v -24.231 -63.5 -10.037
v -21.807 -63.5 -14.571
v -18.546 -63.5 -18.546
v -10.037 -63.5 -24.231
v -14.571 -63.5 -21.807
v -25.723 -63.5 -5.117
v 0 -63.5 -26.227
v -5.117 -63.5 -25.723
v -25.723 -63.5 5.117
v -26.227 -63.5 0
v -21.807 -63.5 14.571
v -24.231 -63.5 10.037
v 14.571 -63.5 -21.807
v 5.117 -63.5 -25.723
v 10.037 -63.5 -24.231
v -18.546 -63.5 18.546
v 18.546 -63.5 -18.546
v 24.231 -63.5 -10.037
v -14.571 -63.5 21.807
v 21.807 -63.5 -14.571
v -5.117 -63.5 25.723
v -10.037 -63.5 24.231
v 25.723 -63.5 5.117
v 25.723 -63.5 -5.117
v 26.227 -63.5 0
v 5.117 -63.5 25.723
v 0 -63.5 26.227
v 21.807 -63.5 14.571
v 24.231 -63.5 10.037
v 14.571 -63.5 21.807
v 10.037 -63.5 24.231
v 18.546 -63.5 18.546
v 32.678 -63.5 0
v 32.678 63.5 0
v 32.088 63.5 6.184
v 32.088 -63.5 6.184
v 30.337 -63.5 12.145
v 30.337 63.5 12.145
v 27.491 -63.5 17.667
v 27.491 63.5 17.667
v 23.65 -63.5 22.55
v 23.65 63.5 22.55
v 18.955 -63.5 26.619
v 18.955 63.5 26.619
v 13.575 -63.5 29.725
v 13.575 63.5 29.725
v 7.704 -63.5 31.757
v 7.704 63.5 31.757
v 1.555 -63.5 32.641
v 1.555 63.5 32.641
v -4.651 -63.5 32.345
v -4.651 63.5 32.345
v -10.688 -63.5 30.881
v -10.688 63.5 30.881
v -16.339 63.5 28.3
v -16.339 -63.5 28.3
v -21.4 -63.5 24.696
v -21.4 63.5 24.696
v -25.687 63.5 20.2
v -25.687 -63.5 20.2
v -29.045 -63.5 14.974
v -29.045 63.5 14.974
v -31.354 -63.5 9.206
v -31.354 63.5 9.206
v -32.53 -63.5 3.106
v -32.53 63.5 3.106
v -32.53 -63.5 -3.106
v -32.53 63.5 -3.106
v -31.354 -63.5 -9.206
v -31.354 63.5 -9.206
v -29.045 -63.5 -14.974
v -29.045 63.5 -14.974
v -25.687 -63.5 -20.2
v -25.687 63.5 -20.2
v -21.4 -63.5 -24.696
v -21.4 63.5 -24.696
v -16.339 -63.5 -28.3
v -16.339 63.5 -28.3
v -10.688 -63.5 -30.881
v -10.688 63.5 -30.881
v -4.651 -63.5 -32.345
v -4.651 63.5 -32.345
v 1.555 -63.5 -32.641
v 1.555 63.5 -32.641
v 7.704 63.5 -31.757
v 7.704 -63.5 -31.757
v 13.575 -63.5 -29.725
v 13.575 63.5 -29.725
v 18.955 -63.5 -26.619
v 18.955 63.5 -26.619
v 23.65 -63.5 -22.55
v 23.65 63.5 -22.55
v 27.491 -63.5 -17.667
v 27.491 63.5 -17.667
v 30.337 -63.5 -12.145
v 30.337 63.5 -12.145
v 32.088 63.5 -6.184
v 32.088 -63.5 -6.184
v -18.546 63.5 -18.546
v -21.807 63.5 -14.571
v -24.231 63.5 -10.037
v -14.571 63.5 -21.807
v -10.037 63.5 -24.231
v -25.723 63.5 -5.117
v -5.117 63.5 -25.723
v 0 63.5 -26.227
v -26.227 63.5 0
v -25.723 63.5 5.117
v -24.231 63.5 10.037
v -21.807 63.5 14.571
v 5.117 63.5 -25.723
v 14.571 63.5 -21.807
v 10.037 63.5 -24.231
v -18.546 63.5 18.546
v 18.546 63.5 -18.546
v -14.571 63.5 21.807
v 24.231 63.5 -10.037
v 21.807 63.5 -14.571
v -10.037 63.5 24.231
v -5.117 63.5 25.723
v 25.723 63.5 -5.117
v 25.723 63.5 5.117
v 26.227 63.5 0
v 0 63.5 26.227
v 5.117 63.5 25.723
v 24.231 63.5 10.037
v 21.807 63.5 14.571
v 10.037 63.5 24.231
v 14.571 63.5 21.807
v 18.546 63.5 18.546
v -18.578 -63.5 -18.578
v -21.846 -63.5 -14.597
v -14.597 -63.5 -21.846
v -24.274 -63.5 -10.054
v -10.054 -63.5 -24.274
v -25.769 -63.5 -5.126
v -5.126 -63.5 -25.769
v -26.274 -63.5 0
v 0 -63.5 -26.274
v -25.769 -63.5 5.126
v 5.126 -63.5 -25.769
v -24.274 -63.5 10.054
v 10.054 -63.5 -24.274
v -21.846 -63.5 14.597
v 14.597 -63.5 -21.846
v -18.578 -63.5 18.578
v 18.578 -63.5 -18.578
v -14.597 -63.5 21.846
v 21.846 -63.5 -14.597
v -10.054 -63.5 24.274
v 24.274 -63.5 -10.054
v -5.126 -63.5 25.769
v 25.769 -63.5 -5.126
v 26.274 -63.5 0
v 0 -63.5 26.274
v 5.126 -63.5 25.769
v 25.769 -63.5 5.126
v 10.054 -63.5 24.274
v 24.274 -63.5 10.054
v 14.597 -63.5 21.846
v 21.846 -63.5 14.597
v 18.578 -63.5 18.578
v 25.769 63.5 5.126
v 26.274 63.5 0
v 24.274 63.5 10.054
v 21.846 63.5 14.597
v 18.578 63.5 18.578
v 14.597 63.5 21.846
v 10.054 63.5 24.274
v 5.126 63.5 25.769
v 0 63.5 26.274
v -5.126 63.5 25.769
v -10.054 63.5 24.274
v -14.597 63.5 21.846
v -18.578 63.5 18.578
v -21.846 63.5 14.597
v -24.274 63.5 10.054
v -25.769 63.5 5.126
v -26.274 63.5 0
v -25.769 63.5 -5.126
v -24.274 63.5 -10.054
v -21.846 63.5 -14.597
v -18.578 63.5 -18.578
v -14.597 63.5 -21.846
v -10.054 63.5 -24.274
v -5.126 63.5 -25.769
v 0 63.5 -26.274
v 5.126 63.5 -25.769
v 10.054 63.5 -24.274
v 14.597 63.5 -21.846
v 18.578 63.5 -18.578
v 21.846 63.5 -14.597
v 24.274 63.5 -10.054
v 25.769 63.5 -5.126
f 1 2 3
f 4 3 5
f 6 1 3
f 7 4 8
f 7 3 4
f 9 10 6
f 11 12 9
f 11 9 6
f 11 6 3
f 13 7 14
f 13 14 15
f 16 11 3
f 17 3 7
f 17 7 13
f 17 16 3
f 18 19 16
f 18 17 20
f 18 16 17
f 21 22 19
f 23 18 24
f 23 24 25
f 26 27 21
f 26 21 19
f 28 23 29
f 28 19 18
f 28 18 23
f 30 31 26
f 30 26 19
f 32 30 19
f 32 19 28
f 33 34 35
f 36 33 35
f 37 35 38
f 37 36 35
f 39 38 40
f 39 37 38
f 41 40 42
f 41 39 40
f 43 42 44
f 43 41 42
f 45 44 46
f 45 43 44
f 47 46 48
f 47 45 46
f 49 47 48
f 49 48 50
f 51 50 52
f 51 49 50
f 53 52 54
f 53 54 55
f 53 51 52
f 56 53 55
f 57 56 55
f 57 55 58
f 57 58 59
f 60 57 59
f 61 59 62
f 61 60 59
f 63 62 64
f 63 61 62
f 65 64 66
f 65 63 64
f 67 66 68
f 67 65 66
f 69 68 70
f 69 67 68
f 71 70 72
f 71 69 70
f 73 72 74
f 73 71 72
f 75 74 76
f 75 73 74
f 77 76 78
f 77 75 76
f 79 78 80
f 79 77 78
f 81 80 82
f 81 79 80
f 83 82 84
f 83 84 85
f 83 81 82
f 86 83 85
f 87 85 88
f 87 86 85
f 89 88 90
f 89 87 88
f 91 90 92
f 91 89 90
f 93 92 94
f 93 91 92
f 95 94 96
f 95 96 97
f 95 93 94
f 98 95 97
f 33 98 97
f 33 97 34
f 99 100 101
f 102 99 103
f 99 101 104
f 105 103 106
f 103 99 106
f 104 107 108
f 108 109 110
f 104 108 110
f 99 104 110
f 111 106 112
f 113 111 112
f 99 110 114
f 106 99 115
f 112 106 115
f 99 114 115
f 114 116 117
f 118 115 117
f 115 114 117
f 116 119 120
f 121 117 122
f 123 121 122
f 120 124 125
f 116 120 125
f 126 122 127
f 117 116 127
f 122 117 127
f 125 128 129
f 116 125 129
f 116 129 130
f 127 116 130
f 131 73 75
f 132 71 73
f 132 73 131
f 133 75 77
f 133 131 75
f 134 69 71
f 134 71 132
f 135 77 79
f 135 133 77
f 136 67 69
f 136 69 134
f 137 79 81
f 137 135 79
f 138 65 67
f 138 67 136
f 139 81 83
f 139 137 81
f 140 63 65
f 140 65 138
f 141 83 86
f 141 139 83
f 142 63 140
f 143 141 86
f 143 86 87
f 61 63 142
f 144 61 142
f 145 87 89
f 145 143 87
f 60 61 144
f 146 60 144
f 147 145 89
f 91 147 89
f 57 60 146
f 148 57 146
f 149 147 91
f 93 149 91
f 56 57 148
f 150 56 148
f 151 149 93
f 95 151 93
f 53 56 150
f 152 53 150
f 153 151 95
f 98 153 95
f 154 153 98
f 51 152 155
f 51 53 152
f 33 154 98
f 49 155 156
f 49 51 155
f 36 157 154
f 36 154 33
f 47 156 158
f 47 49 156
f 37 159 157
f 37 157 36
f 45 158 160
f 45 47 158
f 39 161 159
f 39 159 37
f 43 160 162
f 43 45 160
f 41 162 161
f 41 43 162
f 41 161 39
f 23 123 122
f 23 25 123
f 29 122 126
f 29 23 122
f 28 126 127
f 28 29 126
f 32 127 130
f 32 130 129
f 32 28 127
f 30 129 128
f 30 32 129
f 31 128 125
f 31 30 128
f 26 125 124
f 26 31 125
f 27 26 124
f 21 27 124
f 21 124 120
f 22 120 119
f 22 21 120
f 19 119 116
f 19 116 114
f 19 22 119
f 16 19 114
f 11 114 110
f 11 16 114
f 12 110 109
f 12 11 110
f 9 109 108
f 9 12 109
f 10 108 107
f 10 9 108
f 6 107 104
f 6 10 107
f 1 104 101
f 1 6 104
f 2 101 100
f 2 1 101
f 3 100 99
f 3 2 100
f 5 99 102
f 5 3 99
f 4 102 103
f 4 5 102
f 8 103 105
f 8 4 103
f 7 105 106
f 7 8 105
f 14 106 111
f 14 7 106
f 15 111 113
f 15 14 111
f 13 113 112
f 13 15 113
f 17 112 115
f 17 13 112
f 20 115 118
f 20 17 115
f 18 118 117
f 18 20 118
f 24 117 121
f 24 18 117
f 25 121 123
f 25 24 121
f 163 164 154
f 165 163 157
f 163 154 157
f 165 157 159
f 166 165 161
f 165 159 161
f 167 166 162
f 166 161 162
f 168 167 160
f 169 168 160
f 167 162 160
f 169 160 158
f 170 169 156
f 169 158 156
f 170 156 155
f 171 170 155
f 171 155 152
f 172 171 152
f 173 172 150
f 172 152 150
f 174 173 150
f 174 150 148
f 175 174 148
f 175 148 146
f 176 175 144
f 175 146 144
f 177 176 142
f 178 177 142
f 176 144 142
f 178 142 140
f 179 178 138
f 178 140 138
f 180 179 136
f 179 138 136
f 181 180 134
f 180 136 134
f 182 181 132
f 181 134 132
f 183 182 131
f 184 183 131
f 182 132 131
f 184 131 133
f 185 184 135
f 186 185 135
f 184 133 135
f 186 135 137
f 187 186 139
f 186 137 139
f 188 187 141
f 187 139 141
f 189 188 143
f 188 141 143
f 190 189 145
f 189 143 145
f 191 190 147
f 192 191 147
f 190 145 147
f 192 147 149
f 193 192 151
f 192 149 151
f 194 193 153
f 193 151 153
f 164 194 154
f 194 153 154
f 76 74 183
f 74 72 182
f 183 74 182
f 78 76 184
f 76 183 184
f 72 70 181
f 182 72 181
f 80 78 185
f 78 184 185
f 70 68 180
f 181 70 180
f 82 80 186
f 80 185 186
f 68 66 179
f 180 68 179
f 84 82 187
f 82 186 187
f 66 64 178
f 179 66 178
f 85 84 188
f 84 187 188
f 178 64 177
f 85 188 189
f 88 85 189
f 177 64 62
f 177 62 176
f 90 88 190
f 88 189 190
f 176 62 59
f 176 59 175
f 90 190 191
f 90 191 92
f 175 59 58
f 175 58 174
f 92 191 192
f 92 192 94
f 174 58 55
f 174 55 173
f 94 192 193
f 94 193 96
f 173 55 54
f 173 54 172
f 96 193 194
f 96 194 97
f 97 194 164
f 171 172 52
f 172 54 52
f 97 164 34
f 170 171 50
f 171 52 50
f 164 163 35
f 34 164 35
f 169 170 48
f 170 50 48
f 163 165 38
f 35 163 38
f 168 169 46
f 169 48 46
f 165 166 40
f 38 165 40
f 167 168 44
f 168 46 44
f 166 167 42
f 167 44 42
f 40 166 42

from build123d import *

# Parameters (mm, degrees)
F0_R     = 32.678074
F1_DEPTH = 63.5
F2_R     = 26.273546
F3_DEPTH = 127
F4_R     = 26.227305
F5_DEPTH = 63.5


with BuildPart() as f1:
    # F0 (on Front) → F1 (new body, symmetric)
    with BuildSketch(Plane.XZ):
        Circle(F0_R)
    extrude(amount=F1_DEPTH, both=True)

    # F2 (on Front) → F3 (cut, symmetric)
    with BuildSketch(Plane.XZ):
        Circle(F2_R)
    extrude(amount=F3_DEPTH, both=True, mode=Mode.SUBTRACT)


with BuildPart() as f5:
    # F4 (on Front) → F5 (new body, symmetric)
    with BuildSketch(Plane.XZ):
        Circle(F4_R)
    extrude(amount=F5_DEPTH, both=True)


solid = Compound([f1.part, f5.part])
